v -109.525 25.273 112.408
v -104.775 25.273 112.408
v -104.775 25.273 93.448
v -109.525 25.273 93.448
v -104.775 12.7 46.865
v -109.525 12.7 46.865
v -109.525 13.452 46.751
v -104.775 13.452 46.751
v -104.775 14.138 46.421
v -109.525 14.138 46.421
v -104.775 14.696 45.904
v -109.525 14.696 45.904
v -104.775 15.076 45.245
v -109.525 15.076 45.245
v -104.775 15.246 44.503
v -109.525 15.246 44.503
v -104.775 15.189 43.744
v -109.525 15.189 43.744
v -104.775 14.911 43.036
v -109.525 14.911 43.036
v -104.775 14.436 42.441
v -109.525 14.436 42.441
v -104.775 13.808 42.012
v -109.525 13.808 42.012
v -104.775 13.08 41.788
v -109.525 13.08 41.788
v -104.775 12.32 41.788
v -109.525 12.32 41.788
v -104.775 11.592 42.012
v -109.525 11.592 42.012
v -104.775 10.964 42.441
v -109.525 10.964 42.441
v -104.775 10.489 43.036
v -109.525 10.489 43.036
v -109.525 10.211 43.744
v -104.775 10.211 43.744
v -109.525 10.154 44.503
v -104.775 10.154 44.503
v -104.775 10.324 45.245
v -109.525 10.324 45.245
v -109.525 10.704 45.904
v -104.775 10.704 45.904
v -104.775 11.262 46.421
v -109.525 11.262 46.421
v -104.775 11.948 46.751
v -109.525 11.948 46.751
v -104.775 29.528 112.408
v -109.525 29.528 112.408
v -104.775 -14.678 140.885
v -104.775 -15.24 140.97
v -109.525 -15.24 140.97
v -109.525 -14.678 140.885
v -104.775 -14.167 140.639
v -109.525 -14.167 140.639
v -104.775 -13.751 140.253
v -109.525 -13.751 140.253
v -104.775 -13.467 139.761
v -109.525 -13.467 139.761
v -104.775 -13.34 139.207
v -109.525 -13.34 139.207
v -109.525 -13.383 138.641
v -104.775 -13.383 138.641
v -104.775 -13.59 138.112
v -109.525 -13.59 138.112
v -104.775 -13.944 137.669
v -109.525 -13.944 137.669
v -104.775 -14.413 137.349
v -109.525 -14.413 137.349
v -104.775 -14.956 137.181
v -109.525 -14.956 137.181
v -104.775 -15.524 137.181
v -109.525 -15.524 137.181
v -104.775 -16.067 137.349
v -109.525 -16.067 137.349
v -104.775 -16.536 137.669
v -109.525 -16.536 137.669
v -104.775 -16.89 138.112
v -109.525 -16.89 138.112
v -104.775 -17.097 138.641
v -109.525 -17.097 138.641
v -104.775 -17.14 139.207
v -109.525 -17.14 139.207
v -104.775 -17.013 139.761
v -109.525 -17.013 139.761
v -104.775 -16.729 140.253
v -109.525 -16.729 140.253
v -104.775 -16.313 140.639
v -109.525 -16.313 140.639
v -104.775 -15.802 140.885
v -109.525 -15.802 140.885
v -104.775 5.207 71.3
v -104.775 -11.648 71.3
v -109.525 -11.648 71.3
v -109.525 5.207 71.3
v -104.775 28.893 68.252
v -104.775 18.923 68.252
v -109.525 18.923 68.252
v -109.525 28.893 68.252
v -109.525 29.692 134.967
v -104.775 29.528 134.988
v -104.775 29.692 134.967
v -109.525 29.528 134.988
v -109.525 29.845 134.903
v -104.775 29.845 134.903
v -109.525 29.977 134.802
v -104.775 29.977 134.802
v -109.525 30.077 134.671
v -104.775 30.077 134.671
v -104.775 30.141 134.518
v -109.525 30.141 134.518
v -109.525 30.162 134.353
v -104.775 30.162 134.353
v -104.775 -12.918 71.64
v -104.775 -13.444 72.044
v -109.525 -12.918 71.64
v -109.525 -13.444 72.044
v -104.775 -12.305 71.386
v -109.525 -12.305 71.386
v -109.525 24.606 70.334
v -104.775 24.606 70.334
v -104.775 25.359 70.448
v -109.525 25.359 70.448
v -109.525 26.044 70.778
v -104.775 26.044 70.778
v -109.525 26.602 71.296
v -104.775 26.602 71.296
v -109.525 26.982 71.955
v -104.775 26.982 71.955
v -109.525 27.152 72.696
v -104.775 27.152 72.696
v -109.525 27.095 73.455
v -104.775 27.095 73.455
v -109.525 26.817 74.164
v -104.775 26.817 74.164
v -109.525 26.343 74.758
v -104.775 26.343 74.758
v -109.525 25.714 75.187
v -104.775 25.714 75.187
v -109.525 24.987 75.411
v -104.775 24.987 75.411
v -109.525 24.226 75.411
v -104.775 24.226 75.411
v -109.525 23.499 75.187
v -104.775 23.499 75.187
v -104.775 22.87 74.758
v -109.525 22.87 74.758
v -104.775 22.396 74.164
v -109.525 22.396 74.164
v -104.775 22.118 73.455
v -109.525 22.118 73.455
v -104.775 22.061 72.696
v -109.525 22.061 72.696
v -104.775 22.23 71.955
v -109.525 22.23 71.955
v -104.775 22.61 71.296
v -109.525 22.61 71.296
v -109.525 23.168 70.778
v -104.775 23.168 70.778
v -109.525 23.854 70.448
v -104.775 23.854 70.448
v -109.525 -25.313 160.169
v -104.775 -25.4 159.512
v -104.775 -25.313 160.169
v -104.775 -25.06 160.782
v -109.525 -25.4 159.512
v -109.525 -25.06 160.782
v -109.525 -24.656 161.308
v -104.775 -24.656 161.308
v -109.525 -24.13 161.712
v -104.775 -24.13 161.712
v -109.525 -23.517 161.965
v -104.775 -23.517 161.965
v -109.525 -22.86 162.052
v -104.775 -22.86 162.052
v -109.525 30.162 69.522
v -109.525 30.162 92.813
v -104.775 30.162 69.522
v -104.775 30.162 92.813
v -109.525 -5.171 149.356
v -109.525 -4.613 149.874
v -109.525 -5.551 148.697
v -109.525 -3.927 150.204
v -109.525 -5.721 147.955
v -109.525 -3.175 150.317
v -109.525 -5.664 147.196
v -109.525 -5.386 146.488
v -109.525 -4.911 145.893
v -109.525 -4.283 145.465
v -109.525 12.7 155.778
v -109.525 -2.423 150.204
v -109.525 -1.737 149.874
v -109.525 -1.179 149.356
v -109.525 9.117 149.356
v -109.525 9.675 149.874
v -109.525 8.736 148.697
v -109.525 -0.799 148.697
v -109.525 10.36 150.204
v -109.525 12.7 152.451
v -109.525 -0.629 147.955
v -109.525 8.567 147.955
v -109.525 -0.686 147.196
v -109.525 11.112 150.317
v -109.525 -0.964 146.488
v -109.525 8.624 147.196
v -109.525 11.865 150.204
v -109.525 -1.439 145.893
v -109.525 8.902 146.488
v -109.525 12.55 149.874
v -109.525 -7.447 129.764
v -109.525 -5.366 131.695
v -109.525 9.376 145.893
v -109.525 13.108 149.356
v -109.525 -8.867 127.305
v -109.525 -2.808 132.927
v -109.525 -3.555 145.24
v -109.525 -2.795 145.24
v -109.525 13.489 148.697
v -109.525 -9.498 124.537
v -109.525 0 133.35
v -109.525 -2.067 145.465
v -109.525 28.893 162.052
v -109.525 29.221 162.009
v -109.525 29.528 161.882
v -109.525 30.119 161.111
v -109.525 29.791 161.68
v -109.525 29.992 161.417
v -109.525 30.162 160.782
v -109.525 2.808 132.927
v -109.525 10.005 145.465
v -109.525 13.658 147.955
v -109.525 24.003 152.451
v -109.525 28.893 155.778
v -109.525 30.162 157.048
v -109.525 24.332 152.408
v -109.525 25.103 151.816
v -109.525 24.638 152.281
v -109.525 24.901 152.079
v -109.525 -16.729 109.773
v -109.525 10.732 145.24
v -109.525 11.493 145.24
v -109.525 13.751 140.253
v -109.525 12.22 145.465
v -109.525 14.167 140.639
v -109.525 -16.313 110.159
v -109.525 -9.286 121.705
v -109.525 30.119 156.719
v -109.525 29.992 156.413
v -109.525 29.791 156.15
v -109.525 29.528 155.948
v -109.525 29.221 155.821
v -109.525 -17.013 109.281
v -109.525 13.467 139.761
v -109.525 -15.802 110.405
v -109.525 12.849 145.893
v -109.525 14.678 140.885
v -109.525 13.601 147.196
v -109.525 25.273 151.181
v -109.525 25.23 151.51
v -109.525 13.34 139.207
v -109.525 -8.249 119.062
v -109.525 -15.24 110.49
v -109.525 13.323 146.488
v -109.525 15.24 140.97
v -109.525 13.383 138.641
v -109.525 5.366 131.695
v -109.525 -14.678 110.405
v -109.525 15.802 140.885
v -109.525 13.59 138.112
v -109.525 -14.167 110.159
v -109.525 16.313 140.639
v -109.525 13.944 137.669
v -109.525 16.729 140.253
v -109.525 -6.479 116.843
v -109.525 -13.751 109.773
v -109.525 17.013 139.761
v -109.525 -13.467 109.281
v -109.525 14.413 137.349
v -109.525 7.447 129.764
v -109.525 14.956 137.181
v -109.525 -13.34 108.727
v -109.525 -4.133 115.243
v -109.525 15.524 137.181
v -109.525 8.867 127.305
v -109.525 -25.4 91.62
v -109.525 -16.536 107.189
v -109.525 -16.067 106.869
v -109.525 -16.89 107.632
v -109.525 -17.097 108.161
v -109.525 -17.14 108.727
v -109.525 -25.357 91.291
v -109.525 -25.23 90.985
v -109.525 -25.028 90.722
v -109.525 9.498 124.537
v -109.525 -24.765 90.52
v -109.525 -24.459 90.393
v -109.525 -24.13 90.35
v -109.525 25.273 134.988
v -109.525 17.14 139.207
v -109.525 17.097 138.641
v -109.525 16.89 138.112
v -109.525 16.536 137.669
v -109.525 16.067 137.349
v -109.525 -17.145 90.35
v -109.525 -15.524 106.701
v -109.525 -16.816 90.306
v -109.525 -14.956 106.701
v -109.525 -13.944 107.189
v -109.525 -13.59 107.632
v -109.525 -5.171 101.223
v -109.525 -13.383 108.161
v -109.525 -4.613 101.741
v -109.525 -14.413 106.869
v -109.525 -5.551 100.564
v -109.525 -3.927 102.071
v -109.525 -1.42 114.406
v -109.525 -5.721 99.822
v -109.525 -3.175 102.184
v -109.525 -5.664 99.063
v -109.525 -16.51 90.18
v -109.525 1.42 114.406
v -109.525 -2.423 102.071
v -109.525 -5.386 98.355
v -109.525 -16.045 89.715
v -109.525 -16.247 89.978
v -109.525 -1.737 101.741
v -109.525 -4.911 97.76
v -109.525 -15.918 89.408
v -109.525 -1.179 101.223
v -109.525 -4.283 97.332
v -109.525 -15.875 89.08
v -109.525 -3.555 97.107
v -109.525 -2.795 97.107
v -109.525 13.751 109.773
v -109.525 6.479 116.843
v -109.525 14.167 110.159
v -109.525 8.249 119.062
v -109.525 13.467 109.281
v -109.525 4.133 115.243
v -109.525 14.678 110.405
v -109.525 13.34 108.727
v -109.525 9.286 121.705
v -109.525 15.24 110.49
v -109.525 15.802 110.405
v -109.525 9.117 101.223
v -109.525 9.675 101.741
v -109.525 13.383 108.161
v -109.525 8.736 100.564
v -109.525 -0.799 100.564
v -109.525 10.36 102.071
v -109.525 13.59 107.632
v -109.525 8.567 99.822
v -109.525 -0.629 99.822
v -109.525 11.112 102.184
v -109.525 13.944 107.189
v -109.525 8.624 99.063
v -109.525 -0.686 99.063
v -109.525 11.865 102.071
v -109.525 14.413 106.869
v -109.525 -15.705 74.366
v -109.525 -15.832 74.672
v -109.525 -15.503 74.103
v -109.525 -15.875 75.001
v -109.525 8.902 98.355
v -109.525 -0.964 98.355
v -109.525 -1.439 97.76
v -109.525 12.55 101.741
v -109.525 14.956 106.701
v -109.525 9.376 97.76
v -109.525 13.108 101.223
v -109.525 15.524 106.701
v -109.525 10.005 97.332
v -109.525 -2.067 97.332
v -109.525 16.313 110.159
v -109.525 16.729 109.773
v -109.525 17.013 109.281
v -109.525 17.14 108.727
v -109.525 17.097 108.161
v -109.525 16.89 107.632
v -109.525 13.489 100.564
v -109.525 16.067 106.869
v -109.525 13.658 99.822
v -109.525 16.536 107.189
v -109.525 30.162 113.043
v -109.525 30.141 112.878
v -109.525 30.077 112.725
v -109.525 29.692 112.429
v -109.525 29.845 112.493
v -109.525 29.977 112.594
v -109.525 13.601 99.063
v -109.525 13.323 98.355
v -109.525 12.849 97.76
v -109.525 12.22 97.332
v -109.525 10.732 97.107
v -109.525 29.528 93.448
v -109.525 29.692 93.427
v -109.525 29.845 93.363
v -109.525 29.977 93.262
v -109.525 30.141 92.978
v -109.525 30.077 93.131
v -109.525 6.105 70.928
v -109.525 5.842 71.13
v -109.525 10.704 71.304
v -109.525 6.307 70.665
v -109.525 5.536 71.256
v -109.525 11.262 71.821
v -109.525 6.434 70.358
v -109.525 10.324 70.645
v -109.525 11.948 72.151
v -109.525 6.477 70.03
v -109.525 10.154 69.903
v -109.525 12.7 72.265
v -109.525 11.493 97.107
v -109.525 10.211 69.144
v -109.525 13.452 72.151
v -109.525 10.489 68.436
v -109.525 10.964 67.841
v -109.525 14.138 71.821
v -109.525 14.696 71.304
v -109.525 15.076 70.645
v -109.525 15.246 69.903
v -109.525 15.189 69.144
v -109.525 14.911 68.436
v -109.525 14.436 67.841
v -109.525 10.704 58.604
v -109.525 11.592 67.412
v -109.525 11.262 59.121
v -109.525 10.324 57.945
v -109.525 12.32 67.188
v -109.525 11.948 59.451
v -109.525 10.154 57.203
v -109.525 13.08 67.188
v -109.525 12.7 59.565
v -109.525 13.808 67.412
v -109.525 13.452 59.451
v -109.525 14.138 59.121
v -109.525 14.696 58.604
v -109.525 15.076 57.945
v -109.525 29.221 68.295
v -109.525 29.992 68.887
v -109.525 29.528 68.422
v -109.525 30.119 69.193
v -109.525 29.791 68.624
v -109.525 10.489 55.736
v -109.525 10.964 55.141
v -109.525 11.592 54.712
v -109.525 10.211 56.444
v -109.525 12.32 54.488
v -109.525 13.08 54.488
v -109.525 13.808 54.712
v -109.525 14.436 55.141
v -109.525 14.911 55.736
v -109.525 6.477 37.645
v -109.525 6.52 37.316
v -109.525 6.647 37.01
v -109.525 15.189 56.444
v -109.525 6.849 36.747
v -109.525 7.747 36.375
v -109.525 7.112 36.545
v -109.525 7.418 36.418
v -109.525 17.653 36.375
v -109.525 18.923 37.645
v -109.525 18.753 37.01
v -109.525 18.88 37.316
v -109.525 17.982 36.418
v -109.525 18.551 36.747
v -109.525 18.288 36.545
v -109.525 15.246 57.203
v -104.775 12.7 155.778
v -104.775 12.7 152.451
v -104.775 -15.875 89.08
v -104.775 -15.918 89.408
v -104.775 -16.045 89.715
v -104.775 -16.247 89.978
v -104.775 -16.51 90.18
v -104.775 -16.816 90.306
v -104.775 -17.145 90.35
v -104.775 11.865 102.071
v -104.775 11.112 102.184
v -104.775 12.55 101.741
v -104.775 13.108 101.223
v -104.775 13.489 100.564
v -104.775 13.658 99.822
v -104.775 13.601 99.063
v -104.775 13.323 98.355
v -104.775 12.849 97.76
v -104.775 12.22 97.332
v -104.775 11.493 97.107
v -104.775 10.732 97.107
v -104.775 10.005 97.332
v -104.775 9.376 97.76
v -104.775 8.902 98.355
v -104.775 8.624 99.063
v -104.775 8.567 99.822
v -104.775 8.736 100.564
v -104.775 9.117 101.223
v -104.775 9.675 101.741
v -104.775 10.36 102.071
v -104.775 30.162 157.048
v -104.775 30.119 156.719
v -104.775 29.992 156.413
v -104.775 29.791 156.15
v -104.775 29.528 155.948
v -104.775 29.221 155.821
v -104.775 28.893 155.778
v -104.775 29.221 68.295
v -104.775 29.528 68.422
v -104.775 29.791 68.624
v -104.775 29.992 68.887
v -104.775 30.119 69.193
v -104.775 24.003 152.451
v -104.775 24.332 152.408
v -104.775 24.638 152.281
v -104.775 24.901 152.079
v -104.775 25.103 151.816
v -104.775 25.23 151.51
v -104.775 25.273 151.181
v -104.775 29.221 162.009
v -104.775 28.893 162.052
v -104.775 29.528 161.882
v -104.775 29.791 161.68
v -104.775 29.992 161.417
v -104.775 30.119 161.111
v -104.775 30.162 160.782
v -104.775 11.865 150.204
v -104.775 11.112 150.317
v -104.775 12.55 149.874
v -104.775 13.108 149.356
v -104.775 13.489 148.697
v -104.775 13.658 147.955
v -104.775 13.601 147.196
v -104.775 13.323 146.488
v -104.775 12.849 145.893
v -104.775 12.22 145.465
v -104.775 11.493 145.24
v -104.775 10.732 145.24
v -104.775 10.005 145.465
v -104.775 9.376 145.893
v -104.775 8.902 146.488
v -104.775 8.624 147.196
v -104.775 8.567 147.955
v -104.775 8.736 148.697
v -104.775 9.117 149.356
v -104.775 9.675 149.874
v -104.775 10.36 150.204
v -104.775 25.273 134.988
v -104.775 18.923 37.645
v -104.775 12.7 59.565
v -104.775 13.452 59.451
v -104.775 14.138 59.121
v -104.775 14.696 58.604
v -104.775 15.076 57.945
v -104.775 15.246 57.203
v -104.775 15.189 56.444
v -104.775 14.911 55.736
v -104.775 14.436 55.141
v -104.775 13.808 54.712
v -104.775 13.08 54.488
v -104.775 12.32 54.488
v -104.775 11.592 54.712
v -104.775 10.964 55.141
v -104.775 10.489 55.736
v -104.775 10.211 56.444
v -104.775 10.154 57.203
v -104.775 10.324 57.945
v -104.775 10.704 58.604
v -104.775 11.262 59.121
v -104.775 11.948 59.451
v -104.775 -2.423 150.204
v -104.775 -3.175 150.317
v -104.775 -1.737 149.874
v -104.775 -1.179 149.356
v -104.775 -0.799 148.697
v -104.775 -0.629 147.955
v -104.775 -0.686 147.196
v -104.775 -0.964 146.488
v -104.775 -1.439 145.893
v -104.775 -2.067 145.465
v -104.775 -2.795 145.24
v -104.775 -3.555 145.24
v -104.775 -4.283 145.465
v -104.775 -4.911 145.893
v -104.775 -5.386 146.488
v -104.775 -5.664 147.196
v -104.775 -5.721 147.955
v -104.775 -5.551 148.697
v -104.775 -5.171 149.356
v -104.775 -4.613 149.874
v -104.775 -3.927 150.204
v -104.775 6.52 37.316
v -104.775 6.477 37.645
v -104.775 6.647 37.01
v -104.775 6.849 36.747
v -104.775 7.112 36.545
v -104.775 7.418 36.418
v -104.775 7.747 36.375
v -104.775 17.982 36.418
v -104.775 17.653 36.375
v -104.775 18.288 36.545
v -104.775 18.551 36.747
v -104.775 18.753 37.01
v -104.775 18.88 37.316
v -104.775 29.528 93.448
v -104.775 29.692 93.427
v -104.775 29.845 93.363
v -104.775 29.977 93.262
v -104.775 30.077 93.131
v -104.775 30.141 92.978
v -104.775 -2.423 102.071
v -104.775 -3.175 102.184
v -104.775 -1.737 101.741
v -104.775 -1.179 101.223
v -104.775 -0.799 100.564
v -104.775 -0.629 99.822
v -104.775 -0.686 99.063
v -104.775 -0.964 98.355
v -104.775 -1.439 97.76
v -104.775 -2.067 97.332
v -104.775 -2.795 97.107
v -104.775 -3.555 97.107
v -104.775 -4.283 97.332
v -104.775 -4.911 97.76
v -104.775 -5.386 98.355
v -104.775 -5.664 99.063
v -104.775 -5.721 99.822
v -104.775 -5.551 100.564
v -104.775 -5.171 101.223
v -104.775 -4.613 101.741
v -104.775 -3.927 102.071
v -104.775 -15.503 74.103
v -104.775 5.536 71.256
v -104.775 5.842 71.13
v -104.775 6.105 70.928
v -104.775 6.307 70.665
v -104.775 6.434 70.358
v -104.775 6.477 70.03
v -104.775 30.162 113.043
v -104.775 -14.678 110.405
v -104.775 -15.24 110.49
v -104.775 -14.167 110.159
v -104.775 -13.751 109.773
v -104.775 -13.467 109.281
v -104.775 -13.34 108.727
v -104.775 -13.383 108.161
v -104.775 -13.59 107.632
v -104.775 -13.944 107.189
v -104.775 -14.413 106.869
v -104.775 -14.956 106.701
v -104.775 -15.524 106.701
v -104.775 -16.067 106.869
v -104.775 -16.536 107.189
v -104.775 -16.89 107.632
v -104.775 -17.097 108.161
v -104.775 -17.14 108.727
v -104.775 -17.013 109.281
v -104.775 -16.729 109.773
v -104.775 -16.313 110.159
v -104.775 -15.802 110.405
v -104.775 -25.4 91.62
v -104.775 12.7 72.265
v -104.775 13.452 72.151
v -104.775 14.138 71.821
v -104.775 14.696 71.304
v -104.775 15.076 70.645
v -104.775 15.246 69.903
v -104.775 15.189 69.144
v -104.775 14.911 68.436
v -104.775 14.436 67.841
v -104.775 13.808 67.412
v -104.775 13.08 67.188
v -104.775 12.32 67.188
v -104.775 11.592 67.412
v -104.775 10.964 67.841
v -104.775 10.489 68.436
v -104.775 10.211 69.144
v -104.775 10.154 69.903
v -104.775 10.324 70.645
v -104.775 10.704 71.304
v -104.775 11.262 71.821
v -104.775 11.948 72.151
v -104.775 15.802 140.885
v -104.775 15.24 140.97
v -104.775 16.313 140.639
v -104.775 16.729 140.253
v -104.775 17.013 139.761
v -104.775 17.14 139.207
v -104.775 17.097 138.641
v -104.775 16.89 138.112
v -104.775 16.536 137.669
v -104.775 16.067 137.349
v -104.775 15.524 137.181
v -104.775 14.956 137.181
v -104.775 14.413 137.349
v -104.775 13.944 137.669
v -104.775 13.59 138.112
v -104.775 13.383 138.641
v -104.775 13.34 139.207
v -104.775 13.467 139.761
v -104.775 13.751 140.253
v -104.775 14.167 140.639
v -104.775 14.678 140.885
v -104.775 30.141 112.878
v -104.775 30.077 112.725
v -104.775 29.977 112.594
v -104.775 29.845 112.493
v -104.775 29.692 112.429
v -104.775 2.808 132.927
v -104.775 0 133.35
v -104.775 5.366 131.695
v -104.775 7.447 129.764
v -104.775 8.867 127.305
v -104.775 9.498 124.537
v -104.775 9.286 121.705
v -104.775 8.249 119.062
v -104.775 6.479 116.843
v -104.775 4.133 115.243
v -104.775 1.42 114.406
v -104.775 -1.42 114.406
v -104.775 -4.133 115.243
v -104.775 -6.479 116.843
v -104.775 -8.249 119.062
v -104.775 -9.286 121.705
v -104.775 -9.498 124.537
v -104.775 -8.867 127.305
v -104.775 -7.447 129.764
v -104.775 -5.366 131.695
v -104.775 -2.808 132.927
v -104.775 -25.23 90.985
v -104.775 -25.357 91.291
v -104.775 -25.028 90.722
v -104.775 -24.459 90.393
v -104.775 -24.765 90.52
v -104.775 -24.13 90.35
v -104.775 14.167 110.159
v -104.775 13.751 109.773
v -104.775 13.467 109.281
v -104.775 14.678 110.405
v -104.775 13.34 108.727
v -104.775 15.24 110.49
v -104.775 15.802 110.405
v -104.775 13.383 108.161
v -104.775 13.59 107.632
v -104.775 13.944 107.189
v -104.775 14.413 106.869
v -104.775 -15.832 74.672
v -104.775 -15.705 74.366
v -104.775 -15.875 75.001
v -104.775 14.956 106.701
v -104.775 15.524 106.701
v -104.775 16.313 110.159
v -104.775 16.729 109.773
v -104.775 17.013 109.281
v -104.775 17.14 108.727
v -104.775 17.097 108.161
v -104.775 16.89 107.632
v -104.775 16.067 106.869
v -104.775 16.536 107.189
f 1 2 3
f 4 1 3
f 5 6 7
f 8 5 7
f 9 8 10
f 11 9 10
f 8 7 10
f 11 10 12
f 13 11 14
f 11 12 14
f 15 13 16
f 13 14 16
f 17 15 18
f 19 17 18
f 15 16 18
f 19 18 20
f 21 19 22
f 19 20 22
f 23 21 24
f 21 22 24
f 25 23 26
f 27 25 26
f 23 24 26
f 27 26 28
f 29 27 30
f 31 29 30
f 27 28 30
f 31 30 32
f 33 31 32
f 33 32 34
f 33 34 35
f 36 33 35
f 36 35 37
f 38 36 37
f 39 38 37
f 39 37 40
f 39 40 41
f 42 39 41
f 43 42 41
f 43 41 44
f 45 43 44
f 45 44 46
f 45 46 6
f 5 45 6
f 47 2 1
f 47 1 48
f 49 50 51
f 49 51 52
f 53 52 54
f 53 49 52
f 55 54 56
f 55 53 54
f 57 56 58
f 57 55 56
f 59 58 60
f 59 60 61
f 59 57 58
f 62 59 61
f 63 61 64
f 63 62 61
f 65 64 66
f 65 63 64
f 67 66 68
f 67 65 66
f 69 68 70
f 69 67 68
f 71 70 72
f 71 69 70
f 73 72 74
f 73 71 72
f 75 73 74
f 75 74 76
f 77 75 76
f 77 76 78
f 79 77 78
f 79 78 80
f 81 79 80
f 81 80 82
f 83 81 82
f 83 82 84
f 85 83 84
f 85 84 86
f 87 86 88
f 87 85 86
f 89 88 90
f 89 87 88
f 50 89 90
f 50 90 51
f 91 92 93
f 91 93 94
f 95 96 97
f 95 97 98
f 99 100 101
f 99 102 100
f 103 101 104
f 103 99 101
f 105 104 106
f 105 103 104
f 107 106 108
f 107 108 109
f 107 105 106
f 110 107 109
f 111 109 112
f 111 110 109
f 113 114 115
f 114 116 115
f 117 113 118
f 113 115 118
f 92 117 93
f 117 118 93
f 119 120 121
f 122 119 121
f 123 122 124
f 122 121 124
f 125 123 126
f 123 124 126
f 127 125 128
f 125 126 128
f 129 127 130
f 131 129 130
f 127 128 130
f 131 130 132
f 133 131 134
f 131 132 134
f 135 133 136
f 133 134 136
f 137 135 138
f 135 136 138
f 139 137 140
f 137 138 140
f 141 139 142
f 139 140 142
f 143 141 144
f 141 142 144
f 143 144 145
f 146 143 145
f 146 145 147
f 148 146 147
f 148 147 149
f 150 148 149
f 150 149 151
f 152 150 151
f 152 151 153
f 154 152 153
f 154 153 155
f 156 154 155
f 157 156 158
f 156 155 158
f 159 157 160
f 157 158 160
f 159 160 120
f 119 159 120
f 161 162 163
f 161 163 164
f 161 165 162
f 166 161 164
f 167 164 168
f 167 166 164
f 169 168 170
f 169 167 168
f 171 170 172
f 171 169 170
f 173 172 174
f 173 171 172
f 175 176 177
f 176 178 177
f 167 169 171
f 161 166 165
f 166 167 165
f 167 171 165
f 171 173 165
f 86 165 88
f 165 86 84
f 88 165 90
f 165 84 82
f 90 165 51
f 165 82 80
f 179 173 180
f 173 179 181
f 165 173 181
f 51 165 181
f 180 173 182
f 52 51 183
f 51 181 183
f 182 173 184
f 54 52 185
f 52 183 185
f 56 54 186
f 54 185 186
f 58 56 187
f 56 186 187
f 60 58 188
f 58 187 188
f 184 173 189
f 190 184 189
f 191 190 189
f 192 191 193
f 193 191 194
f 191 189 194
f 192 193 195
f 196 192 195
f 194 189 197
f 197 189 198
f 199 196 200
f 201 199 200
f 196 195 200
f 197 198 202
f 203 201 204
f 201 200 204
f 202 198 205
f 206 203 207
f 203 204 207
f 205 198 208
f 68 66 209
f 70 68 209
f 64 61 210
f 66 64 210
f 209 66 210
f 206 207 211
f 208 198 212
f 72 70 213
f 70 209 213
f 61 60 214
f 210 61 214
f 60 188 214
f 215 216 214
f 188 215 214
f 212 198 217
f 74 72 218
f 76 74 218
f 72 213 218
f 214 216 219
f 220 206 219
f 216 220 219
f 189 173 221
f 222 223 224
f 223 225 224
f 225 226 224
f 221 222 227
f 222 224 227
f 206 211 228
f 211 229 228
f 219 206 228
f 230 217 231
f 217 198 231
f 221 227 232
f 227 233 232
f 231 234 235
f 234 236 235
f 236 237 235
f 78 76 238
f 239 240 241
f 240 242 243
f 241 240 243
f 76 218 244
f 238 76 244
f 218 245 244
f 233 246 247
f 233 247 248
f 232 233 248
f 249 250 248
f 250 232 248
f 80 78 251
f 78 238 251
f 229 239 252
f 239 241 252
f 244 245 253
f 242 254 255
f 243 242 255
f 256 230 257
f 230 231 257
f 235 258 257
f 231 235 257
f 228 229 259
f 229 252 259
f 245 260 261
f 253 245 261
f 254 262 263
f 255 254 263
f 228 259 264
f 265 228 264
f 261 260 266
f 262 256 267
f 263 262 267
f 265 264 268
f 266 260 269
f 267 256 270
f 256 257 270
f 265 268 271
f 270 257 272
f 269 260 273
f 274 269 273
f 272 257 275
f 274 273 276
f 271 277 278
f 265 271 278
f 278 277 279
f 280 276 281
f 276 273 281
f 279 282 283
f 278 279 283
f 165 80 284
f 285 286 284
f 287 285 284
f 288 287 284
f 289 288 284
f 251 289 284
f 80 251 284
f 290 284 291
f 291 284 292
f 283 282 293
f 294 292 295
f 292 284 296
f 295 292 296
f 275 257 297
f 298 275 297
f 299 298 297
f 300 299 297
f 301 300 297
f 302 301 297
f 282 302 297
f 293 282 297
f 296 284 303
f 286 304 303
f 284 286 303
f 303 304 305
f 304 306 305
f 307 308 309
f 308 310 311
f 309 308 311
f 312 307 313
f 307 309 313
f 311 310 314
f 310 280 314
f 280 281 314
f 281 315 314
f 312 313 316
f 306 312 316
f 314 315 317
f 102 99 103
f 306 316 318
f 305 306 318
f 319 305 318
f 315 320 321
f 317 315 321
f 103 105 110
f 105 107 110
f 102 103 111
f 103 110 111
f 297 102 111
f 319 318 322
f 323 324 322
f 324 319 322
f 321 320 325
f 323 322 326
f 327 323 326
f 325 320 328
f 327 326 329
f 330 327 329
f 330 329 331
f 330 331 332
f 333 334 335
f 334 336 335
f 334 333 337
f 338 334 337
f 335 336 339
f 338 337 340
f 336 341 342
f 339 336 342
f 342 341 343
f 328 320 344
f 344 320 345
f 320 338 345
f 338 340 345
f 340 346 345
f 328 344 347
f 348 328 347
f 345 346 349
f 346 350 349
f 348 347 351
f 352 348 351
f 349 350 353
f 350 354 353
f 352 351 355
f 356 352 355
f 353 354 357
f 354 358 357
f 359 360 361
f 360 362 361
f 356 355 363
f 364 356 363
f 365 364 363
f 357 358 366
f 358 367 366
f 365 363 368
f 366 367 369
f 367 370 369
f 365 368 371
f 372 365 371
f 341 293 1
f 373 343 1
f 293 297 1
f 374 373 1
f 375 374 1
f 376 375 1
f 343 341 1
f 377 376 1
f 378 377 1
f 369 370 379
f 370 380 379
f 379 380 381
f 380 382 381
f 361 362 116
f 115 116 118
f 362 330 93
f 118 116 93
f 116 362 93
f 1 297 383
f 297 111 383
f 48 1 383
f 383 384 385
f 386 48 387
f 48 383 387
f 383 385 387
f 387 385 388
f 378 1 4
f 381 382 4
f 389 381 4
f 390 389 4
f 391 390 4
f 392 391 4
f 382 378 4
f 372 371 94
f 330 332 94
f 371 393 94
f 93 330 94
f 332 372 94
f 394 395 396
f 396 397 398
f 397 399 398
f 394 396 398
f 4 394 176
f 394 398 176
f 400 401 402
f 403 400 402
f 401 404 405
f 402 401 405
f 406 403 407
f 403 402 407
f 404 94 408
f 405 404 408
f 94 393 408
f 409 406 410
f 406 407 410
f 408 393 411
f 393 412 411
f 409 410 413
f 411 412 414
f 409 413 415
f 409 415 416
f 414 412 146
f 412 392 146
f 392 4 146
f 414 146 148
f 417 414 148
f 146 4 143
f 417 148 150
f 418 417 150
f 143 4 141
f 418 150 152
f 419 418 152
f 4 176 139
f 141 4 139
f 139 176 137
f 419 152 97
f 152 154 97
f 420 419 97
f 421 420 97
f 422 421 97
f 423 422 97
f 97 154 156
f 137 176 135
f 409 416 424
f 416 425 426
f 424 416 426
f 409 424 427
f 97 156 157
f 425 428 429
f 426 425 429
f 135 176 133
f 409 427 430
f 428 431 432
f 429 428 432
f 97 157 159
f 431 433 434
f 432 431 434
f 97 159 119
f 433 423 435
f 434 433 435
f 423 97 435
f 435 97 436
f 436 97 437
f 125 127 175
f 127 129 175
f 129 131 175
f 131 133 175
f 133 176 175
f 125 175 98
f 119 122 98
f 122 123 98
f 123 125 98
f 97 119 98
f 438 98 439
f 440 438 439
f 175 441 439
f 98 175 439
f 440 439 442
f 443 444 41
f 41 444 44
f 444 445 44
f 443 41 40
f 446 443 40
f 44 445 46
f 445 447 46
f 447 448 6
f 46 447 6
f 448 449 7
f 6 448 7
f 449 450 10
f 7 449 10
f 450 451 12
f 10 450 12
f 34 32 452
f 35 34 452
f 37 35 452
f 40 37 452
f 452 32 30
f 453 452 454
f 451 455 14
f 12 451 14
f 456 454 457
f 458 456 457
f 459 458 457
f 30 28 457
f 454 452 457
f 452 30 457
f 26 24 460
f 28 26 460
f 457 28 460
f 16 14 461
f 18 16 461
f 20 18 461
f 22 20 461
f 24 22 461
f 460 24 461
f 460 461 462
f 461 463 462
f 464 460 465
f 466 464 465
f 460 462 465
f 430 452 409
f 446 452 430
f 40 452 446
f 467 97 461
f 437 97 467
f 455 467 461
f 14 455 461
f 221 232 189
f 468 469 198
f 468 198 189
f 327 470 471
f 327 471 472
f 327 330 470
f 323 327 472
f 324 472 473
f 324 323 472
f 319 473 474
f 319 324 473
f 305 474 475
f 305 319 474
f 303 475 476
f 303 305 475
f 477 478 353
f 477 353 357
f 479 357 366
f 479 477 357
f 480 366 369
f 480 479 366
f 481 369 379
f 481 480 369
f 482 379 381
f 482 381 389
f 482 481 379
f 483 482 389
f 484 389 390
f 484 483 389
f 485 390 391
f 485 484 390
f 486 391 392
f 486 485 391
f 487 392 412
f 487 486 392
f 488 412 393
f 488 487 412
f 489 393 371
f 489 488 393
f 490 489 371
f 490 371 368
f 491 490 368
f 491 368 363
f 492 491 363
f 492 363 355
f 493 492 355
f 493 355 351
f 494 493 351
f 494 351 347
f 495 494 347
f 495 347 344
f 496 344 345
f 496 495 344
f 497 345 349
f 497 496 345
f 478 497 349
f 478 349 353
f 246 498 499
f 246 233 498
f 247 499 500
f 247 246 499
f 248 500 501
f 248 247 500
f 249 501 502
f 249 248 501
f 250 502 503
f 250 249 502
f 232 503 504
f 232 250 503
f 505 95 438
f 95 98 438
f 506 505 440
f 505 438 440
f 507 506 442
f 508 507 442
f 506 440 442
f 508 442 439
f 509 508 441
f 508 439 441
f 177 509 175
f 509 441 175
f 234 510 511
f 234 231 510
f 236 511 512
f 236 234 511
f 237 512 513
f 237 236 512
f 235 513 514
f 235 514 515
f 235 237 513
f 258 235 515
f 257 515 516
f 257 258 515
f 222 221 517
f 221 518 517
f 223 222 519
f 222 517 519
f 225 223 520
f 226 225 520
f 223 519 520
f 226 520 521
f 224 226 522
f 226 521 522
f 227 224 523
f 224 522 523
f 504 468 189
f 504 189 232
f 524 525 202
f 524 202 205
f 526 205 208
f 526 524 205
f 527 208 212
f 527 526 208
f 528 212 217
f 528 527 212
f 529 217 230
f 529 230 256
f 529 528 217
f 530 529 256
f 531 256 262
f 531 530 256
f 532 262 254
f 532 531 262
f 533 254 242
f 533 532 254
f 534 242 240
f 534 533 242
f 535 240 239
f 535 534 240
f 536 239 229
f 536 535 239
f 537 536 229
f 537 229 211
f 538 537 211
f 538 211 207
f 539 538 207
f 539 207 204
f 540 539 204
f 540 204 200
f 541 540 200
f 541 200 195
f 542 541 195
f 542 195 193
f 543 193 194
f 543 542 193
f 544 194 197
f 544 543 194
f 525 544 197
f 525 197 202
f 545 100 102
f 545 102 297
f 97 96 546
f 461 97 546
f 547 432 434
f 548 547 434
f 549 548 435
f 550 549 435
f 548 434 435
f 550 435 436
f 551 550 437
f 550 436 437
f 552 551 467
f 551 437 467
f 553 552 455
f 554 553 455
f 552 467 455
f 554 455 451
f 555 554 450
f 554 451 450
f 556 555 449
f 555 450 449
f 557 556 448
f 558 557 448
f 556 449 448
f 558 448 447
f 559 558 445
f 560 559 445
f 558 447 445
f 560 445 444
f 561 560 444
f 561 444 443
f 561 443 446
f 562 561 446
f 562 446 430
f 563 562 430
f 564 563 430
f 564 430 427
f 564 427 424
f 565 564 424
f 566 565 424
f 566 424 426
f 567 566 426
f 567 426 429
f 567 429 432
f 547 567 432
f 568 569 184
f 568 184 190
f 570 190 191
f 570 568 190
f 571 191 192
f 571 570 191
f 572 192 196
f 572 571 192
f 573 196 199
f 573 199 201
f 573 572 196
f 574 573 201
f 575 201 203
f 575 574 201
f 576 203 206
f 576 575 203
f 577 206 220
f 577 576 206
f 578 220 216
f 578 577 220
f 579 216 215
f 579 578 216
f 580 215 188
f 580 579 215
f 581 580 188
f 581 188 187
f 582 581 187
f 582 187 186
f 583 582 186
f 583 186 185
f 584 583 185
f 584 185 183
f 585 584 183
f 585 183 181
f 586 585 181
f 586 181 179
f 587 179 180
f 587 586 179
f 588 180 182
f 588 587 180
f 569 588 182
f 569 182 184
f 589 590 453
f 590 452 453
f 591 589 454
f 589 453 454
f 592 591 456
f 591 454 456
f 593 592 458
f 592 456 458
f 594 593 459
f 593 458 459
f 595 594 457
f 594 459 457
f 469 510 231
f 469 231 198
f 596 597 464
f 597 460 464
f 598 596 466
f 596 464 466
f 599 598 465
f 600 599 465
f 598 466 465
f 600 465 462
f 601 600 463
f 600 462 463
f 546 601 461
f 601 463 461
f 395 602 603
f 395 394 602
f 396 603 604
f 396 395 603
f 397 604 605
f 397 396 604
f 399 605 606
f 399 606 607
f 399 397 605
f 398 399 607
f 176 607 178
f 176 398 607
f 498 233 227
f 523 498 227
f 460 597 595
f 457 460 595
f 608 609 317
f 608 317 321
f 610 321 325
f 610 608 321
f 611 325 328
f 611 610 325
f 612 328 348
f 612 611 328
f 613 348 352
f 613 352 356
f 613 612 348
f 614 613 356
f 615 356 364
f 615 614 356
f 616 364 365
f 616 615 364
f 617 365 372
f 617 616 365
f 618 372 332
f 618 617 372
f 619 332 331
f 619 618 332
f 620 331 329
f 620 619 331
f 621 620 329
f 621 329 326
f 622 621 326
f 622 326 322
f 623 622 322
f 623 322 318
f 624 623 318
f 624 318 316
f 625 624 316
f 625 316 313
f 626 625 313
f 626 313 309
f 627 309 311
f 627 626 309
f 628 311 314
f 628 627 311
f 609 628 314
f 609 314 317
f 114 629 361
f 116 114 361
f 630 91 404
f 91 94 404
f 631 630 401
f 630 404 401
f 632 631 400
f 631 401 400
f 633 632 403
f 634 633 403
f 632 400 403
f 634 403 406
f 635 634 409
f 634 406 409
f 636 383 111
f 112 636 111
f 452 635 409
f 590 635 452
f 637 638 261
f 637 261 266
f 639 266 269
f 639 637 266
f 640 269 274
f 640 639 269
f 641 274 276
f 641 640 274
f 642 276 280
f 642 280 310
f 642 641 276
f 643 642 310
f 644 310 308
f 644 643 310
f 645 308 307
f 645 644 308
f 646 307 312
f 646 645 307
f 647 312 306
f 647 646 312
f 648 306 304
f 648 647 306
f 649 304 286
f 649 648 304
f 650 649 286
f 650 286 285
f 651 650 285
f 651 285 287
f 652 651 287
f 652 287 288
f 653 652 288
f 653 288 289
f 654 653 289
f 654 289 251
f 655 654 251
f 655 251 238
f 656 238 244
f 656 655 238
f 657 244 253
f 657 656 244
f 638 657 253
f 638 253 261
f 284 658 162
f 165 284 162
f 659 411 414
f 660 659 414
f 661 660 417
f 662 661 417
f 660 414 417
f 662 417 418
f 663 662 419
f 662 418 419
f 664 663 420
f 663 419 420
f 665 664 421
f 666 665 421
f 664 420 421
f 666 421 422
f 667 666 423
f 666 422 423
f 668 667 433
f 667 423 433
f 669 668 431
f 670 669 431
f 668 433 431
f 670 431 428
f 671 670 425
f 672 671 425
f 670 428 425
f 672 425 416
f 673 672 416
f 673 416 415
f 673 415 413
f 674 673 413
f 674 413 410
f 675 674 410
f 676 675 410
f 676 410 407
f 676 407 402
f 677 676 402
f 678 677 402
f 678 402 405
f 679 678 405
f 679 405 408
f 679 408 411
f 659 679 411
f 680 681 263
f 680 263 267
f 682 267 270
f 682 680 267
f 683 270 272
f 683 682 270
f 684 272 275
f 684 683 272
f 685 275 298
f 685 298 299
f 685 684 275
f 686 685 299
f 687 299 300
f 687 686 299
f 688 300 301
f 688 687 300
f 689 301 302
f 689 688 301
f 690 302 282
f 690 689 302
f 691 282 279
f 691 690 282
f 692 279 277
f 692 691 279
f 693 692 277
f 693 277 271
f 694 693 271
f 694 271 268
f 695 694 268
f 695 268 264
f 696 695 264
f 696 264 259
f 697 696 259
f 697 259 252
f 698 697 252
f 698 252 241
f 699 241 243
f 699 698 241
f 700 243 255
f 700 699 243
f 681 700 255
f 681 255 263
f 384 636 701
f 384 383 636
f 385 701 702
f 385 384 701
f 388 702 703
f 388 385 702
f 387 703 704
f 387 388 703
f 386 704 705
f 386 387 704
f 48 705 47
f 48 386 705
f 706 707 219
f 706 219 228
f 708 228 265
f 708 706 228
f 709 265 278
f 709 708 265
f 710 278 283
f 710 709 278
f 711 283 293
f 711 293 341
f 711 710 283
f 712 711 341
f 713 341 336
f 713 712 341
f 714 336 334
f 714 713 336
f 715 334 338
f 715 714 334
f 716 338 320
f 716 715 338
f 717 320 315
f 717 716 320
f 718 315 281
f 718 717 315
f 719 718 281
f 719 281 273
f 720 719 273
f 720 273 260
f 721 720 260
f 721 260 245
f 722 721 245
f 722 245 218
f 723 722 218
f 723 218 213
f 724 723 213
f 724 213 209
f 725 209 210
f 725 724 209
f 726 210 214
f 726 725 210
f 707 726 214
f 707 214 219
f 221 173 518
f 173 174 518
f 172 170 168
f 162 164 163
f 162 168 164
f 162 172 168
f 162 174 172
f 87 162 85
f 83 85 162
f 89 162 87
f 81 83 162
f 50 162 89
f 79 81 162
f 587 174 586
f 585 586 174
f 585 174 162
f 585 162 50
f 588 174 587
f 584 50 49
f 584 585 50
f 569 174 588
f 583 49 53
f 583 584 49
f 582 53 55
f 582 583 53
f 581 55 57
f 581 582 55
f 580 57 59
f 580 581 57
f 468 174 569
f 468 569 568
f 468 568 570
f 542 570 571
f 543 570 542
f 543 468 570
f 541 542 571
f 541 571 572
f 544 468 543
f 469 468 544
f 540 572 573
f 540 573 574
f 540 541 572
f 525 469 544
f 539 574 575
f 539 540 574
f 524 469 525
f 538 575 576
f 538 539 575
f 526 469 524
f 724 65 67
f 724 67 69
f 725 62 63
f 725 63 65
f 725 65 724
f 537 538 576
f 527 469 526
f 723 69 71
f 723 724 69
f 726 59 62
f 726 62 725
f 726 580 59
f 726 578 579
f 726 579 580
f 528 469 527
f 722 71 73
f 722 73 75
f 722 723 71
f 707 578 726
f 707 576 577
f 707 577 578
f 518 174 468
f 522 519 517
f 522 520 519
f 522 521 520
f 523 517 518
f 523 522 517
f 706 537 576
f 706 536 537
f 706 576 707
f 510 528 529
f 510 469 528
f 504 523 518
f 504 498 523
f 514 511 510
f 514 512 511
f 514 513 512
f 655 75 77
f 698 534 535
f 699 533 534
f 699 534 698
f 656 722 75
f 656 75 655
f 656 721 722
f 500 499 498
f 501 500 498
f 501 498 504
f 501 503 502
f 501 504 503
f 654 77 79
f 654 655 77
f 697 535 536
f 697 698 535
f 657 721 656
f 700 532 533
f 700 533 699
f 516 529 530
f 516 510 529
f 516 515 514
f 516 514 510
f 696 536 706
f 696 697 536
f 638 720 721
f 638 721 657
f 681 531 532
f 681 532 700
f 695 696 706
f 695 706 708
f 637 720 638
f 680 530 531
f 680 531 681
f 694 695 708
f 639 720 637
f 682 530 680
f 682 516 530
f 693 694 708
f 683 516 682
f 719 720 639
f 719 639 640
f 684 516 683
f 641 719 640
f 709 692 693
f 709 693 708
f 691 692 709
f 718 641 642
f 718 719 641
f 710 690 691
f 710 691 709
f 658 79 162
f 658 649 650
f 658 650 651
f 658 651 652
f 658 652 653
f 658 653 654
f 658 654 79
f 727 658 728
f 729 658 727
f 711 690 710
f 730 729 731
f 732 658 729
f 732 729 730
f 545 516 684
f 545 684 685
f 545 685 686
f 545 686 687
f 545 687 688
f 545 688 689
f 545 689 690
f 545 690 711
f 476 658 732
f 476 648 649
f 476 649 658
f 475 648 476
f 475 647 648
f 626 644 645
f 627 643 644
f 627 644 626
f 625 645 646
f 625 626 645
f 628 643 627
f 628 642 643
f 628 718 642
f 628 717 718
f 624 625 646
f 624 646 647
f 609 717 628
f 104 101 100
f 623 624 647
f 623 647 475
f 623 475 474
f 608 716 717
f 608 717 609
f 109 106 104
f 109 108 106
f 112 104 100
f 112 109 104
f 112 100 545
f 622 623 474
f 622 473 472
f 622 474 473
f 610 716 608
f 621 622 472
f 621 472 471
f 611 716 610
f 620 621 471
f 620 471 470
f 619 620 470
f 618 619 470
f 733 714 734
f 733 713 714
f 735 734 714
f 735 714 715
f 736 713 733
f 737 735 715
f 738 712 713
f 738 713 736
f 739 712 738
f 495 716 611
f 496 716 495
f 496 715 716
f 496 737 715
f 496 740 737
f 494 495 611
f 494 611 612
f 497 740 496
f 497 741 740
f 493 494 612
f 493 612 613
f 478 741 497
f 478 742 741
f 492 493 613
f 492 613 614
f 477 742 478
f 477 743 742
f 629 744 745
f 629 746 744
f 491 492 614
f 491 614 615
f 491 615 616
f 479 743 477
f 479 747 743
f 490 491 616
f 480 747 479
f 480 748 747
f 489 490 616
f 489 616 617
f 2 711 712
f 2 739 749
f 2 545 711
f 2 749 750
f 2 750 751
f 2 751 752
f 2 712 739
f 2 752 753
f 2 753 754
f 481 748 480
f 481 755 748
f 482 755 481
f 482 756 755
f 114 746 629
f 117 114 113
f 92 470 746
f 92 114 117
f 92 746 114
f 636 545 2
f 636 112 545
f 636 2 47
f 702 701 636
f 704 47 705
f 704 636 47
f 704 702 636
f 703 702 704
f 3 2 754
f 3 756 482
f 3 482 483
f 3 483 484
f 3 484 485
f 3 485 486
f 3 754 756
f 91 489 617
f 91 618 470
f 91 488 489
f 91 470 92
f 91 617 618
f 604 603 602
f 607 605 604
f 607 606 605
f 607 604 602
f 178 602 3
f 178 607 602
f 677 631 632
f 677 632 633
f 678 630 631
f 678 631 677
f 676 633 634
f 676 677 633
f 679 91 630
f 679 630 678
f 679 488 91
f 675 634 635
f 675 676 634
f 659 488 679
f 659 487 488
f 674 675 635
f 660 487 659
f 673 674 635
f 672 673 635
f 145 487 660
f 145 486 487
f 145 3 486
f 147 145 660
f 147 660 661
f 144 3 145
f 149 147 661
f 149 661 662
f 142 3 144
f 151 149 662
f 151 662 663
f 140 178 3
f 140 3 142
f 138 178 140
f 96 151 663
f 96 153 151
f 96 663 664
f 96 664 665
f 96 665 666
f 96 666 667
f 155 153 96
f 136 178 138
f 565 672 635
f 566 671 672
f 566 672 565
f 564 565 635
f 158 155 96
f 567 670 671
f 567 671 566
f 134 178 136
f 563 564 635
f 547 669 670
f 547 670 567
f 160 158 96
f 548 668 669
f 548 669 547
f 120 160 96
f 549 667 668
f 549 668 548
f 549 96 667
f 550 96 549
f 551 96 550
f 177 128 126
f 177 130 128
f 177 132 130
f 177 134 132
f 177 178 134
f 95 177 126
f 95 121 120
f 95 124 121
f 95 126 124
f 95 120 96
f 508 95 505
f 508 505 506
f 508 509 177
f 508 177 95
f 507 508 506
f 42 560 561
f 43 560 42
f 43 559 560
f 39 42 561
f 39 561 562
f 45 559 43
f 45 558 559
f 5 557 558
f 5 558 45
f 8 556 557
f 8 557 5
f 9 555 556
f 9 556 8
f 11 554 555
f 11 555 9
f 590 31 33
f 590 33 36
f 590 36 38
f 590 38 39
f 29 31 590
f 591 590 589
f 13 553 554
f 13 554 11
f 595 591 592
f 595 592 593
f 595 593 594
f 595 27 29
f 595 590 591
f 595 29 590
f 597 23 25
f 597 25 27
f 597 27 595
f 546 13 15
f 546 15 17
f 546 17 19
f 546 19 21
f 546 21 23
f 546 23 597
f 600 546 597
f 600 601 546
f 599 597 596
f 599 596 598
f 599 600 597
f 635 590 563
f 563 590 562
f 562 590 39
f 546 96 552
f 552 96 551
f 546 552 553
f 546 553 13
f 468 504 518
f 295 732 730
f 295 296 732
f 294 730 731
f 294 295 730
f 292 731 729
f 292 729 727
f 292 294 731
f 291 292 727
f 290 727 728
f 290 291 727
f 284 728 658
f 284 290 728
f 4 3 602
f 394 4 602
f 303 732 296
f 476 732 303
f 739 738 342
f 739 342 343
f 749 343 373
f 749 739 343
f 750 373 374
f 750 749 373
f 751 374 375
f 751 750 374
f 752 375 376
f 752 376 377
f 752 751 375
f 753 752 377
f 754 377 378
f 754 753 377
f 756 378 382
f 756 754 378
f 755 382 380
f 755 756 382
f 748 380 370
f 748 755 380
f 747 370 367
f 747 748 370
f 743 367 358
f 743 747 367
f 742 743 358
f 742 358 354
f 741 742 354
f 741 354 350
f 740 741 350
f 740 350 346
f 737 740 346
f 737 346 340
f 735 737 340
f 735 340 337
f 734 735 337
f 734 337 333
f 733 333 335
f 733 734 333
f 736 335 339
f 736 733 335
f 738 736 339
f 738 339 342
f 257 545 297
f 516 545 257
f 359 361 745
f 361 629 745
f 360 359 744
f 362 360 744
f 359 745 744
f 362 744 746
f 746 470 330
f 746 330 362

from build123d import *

# Parameters (mm, degrees)
SKETCH6_R                   = 9.525
SKETCH6_R_2                 = 1.905
SKETCH6_R_3                 = 2.5527
SIDE_PLATE_EXTRUDE_DEPTH    = 4.7498
SKETCH15_R                  = 2.5527
CUSTOM_NUTSTRIP_HOLES_DEPTH = 5.7498
SKETCH43_W                  = 3.175
SKETCH43_H                  = 12.7
CUT_EXTRUDE19_DEPTH         = 5.7498
SKETCH73_W                  = 15.875
SKETCH73_H                  = 4.7625
SKETCH73_W_2                = 22.733
SKETCH73_W_3                = 6.35
BOSS_EXTRUDE28_DEPTH        = 4.7498
SKETCH108_W                 = 9.525
SKETCH108_H                 = 11.1125
SKETCH108_R                 = 2.5527
BOSS_EXTRUDE35_DEPTH        = 4.7498
SKETCH90_W                  = 18.959213894
SKETCH90_H                  = 4.8895
SKETCH90_W_2                = 34.925
SKETCH90_H_2                = 31.877
SIDE_PLATE_TOLERENCES_DEPTH = 5.7498
CHAMFER8_SIZE               = 12.7
FILLET15_R                  = 2.54
FILLET26_R                  = 1.27
FILLET29_R                  = 0.635
SKETCH109_W                 = 19.05
SKETCH109_H                 = 9.525
CUT_EXTRUDE20_DEPTH         = 5.7498
FILLET30_R                  = 1.27


with BuildPart() as part:
    # Sketch6 → Side Plate Extrude (new body)
    with BuildSketch(Plane.ZY.offset(104.775)):
        Polygon((162.052, -25.4), (162.052, 25.4), (77.649686106, 25.4), (77.649686106, 19.05), (36.374686106, 19.05), (36.374686106, 6.35), (71.299686106, 6.35), (71.299686106, -25.4), align=None)
        with Locations((123.825, 0)):
            Circle(SKETCH6_R, mode=Mode.SUBTRACT)
        with Locations((108.585, -15.24)):
            Circle(SKETCH6_R_2, mode=Mode.SUBTRACT)
        with Locations((108.585, 15.24)):
            Circle(SKETCH6_R_2, mode=Mode.SUBTRACT)
        with Locations((139.065, 15.24)):
            Circle(SKETCH6_R_2, mode=Mode.SUBTRACT)
        with Locations((139.065, -15.24)):
            Circle(SKETCH6_R_2, mode=Mode.SUBTRACT)
        with Locations((147.7645, 11.1125)):
            Circle(SKETCH6_R_3, mode=Mode.SUBTRACT)
        with Locations((99.6315, 11.1125)):
            Circle(SKETCH6_R_3, mode=Mode.SUBTRACT)
        with Locations((99.6315, -3.175)):
            Circle(SKETCH6_R_3, mode=Mode.SUBTRACT)
        with Locations((147.7645, -3.175)):
            Circle(SKETCH6_R_3, mode=Mode.SUBTRACT)
    extrude(amount=SIDE_PLATE_EXTRUDE_DEPTH)

    # Sketch15 → Custom Nutstrip Holes (cut, through all)
    with BuildSketch(Plane.ZY.offset(109.5248)):
        with Locations((44.312186106, 12.7)):
            Circle(SKETCH15_R)
        with Locations((57.012186106, 12.7)):
            Circle(SKETCH15_R)
        with Locations((69.712186106, 12.7)):
            Circle(SKETCH15_R)
    extrude(amount=-CUSTOM_NUTSTRIP_HOLES_DEPTH, mode=Mode.SUBTRACT)

    # Sketch43 → Cut-Extrude19 (cut, through all)
    with BuildSketch(Plane.ZY.offset(109.5248)):
        with Locations((154.1145, 19.05)):
            Rectangle(SKETCH43_W, SKETCH43_H)
    extrude(amount=-CUT_EXTRUDE19_DEPTH, mode=Mode.SUBTRACT)

    # Sketch73 → Boss-Extrude28 (add, through all)
    with BuildSketch(Plane.ZY.offset(109.5248)):
        with Locations((85.587186106, 27.78125)):
            Rectangle(SKETCH73_W, SKETCH73_H)
        with Locations((123.698, 27.78125)):
            Rectangle(SKETCH73_W_2, SKETCH73_H)
        with Locations((158.877, 27.78125)):
            Rectangle(SKETCH73_W_3, SKETCH73_H)
    extrude(amount=-BOSS_EXTRUDE28_DEPTH)

    # Sketch108 → Boss-Extrude35 (add, through all)
    with BuildSketch(Plane(origin=(-104.775, 0, 0), x_dir=(0, 0, -1), z_dir=(1, 0, 0))):
        with Locations((-72.887186106, 24.60625)):
            Rectangle(SKETCH108_W, SKETCH108_H)
        with Locations((-72.887186106, 24.60625)):
            Circle(SKETCH108_R, mode=Mode.SUBTRACT)
    extrude(amount=-BOSS_EXTRUDE35_DEPTH)

    # Sketch90 → Side Plate Tolerences (cut, through all)
    with BuildSketch(Plane(origin=(-104.775, 0, 0), x_dir=(0, 0, -1), z_dir=(1, 0, 0))):
        Polygon((-152.4508, 12.7), (-155.7782, 12.7), (-155.7782, 30.1625), (-152.4508, 30.1625), (-134.9883, 30.1625), (-134.9883, 25.273), (-152.4508, 25.273), align=None)
        with Locations((-102.928093053, 27.71775)):
            Rectangle(SKETCH90_W, SKETCH90_H)
        Polygon((-68.124686106, 19.05), (-36.374686106, 19.05), (-36.374686106, 18.923), (-68.124686106, 18.923), (-68.251686106, 18.923), (-68.251686106, 30.1625), (-68.124686106, 30.1625), align=None)
        with Locations((-53.837186106, -9.4615)):
            Rectangle(SKETCH90_W_2, SKETCH90_H_2)
    extrude(amount=-SIDE_PLATE_TOLERENCES_DEPTH, mode=Mode.SUBTRACT)

    # Chamfer8
    chamfer8_edges = [part.edges().sort_by_distance(p)[0] for p in [
        (-107.1499, -25.4, 71.299686106),
    ]]
    chamfer(chamfer8_edges, length=CHAMFER8_SIZE)

    # Fillet15
    fillet15_edges = [part.edges().sort_by_distance(p)[0] for p in [
        (-107.1499, -25.4, 162.052),
        (-107.1499, -25.4, 83.999686106),
        (-107.1499, -12.7, 71.299686106),
    ]]
    fillet(fillet15_edges, radius=FILLET15_R)

    # Fillet26
    fillet26_edges = [part.edges().sort_by_distance(p)[0] for p in [
        (-107.1499, 30.1625, 162.052),
        (-107.1499, 30.1625, 155.7782),
        (-107.1499, 25.273, 152.4508),
        (-107.1499, 18.923, 36.374686106),
        (-107.1499, 30.1625, 68.251686106),
        (-107.1499, 6.477, 36.374686106),
        (-107.1499, 6.477, 71.299686106),
    ]]
    fillet(fillet26_edges, radius=FILLET26_R)

    # Fillet29
    fillet29_edges = [part.edges().sort_by_distance(p)[0] for p in [
        (-107.1499, 30.1625, 134.9883),
        (-107.1499, 30.1625, 112.4077),
        (-107.1499, 30.1625, 93.448486106),
    ]]
    fillet(fillet29_edges, radius=FILLET29_R)

    # Sketch109 → Cut-Extrude20 (cut, through all)
    with BuildSketch(Plane(origin=(-104.775, 0, 0), x_dir=(0, 0, -1), z_dir=(1, 0, 0))):
        with Locations((-80.824686106, -20.6375)):
            Rectangle(SKETCH109_W, SKETCH109_H)
    extrude(amount=-CUT_EXTRUDE20_DEPTH, mode=Mode.SUBTRACT)

    # Fillet30
    fillet30_edges = [part.edges().sort_by_distance(p)[0] for p in [
        (-107.1499, -15.875, 74.474686106),
        (-107.1499, -25.4, 90.349686106),
        (-107.1499, -15.875, 90.349686106),
    ]]
    fillet(fillet30_edges, radius=FILLET30_R)


solid = part.part
